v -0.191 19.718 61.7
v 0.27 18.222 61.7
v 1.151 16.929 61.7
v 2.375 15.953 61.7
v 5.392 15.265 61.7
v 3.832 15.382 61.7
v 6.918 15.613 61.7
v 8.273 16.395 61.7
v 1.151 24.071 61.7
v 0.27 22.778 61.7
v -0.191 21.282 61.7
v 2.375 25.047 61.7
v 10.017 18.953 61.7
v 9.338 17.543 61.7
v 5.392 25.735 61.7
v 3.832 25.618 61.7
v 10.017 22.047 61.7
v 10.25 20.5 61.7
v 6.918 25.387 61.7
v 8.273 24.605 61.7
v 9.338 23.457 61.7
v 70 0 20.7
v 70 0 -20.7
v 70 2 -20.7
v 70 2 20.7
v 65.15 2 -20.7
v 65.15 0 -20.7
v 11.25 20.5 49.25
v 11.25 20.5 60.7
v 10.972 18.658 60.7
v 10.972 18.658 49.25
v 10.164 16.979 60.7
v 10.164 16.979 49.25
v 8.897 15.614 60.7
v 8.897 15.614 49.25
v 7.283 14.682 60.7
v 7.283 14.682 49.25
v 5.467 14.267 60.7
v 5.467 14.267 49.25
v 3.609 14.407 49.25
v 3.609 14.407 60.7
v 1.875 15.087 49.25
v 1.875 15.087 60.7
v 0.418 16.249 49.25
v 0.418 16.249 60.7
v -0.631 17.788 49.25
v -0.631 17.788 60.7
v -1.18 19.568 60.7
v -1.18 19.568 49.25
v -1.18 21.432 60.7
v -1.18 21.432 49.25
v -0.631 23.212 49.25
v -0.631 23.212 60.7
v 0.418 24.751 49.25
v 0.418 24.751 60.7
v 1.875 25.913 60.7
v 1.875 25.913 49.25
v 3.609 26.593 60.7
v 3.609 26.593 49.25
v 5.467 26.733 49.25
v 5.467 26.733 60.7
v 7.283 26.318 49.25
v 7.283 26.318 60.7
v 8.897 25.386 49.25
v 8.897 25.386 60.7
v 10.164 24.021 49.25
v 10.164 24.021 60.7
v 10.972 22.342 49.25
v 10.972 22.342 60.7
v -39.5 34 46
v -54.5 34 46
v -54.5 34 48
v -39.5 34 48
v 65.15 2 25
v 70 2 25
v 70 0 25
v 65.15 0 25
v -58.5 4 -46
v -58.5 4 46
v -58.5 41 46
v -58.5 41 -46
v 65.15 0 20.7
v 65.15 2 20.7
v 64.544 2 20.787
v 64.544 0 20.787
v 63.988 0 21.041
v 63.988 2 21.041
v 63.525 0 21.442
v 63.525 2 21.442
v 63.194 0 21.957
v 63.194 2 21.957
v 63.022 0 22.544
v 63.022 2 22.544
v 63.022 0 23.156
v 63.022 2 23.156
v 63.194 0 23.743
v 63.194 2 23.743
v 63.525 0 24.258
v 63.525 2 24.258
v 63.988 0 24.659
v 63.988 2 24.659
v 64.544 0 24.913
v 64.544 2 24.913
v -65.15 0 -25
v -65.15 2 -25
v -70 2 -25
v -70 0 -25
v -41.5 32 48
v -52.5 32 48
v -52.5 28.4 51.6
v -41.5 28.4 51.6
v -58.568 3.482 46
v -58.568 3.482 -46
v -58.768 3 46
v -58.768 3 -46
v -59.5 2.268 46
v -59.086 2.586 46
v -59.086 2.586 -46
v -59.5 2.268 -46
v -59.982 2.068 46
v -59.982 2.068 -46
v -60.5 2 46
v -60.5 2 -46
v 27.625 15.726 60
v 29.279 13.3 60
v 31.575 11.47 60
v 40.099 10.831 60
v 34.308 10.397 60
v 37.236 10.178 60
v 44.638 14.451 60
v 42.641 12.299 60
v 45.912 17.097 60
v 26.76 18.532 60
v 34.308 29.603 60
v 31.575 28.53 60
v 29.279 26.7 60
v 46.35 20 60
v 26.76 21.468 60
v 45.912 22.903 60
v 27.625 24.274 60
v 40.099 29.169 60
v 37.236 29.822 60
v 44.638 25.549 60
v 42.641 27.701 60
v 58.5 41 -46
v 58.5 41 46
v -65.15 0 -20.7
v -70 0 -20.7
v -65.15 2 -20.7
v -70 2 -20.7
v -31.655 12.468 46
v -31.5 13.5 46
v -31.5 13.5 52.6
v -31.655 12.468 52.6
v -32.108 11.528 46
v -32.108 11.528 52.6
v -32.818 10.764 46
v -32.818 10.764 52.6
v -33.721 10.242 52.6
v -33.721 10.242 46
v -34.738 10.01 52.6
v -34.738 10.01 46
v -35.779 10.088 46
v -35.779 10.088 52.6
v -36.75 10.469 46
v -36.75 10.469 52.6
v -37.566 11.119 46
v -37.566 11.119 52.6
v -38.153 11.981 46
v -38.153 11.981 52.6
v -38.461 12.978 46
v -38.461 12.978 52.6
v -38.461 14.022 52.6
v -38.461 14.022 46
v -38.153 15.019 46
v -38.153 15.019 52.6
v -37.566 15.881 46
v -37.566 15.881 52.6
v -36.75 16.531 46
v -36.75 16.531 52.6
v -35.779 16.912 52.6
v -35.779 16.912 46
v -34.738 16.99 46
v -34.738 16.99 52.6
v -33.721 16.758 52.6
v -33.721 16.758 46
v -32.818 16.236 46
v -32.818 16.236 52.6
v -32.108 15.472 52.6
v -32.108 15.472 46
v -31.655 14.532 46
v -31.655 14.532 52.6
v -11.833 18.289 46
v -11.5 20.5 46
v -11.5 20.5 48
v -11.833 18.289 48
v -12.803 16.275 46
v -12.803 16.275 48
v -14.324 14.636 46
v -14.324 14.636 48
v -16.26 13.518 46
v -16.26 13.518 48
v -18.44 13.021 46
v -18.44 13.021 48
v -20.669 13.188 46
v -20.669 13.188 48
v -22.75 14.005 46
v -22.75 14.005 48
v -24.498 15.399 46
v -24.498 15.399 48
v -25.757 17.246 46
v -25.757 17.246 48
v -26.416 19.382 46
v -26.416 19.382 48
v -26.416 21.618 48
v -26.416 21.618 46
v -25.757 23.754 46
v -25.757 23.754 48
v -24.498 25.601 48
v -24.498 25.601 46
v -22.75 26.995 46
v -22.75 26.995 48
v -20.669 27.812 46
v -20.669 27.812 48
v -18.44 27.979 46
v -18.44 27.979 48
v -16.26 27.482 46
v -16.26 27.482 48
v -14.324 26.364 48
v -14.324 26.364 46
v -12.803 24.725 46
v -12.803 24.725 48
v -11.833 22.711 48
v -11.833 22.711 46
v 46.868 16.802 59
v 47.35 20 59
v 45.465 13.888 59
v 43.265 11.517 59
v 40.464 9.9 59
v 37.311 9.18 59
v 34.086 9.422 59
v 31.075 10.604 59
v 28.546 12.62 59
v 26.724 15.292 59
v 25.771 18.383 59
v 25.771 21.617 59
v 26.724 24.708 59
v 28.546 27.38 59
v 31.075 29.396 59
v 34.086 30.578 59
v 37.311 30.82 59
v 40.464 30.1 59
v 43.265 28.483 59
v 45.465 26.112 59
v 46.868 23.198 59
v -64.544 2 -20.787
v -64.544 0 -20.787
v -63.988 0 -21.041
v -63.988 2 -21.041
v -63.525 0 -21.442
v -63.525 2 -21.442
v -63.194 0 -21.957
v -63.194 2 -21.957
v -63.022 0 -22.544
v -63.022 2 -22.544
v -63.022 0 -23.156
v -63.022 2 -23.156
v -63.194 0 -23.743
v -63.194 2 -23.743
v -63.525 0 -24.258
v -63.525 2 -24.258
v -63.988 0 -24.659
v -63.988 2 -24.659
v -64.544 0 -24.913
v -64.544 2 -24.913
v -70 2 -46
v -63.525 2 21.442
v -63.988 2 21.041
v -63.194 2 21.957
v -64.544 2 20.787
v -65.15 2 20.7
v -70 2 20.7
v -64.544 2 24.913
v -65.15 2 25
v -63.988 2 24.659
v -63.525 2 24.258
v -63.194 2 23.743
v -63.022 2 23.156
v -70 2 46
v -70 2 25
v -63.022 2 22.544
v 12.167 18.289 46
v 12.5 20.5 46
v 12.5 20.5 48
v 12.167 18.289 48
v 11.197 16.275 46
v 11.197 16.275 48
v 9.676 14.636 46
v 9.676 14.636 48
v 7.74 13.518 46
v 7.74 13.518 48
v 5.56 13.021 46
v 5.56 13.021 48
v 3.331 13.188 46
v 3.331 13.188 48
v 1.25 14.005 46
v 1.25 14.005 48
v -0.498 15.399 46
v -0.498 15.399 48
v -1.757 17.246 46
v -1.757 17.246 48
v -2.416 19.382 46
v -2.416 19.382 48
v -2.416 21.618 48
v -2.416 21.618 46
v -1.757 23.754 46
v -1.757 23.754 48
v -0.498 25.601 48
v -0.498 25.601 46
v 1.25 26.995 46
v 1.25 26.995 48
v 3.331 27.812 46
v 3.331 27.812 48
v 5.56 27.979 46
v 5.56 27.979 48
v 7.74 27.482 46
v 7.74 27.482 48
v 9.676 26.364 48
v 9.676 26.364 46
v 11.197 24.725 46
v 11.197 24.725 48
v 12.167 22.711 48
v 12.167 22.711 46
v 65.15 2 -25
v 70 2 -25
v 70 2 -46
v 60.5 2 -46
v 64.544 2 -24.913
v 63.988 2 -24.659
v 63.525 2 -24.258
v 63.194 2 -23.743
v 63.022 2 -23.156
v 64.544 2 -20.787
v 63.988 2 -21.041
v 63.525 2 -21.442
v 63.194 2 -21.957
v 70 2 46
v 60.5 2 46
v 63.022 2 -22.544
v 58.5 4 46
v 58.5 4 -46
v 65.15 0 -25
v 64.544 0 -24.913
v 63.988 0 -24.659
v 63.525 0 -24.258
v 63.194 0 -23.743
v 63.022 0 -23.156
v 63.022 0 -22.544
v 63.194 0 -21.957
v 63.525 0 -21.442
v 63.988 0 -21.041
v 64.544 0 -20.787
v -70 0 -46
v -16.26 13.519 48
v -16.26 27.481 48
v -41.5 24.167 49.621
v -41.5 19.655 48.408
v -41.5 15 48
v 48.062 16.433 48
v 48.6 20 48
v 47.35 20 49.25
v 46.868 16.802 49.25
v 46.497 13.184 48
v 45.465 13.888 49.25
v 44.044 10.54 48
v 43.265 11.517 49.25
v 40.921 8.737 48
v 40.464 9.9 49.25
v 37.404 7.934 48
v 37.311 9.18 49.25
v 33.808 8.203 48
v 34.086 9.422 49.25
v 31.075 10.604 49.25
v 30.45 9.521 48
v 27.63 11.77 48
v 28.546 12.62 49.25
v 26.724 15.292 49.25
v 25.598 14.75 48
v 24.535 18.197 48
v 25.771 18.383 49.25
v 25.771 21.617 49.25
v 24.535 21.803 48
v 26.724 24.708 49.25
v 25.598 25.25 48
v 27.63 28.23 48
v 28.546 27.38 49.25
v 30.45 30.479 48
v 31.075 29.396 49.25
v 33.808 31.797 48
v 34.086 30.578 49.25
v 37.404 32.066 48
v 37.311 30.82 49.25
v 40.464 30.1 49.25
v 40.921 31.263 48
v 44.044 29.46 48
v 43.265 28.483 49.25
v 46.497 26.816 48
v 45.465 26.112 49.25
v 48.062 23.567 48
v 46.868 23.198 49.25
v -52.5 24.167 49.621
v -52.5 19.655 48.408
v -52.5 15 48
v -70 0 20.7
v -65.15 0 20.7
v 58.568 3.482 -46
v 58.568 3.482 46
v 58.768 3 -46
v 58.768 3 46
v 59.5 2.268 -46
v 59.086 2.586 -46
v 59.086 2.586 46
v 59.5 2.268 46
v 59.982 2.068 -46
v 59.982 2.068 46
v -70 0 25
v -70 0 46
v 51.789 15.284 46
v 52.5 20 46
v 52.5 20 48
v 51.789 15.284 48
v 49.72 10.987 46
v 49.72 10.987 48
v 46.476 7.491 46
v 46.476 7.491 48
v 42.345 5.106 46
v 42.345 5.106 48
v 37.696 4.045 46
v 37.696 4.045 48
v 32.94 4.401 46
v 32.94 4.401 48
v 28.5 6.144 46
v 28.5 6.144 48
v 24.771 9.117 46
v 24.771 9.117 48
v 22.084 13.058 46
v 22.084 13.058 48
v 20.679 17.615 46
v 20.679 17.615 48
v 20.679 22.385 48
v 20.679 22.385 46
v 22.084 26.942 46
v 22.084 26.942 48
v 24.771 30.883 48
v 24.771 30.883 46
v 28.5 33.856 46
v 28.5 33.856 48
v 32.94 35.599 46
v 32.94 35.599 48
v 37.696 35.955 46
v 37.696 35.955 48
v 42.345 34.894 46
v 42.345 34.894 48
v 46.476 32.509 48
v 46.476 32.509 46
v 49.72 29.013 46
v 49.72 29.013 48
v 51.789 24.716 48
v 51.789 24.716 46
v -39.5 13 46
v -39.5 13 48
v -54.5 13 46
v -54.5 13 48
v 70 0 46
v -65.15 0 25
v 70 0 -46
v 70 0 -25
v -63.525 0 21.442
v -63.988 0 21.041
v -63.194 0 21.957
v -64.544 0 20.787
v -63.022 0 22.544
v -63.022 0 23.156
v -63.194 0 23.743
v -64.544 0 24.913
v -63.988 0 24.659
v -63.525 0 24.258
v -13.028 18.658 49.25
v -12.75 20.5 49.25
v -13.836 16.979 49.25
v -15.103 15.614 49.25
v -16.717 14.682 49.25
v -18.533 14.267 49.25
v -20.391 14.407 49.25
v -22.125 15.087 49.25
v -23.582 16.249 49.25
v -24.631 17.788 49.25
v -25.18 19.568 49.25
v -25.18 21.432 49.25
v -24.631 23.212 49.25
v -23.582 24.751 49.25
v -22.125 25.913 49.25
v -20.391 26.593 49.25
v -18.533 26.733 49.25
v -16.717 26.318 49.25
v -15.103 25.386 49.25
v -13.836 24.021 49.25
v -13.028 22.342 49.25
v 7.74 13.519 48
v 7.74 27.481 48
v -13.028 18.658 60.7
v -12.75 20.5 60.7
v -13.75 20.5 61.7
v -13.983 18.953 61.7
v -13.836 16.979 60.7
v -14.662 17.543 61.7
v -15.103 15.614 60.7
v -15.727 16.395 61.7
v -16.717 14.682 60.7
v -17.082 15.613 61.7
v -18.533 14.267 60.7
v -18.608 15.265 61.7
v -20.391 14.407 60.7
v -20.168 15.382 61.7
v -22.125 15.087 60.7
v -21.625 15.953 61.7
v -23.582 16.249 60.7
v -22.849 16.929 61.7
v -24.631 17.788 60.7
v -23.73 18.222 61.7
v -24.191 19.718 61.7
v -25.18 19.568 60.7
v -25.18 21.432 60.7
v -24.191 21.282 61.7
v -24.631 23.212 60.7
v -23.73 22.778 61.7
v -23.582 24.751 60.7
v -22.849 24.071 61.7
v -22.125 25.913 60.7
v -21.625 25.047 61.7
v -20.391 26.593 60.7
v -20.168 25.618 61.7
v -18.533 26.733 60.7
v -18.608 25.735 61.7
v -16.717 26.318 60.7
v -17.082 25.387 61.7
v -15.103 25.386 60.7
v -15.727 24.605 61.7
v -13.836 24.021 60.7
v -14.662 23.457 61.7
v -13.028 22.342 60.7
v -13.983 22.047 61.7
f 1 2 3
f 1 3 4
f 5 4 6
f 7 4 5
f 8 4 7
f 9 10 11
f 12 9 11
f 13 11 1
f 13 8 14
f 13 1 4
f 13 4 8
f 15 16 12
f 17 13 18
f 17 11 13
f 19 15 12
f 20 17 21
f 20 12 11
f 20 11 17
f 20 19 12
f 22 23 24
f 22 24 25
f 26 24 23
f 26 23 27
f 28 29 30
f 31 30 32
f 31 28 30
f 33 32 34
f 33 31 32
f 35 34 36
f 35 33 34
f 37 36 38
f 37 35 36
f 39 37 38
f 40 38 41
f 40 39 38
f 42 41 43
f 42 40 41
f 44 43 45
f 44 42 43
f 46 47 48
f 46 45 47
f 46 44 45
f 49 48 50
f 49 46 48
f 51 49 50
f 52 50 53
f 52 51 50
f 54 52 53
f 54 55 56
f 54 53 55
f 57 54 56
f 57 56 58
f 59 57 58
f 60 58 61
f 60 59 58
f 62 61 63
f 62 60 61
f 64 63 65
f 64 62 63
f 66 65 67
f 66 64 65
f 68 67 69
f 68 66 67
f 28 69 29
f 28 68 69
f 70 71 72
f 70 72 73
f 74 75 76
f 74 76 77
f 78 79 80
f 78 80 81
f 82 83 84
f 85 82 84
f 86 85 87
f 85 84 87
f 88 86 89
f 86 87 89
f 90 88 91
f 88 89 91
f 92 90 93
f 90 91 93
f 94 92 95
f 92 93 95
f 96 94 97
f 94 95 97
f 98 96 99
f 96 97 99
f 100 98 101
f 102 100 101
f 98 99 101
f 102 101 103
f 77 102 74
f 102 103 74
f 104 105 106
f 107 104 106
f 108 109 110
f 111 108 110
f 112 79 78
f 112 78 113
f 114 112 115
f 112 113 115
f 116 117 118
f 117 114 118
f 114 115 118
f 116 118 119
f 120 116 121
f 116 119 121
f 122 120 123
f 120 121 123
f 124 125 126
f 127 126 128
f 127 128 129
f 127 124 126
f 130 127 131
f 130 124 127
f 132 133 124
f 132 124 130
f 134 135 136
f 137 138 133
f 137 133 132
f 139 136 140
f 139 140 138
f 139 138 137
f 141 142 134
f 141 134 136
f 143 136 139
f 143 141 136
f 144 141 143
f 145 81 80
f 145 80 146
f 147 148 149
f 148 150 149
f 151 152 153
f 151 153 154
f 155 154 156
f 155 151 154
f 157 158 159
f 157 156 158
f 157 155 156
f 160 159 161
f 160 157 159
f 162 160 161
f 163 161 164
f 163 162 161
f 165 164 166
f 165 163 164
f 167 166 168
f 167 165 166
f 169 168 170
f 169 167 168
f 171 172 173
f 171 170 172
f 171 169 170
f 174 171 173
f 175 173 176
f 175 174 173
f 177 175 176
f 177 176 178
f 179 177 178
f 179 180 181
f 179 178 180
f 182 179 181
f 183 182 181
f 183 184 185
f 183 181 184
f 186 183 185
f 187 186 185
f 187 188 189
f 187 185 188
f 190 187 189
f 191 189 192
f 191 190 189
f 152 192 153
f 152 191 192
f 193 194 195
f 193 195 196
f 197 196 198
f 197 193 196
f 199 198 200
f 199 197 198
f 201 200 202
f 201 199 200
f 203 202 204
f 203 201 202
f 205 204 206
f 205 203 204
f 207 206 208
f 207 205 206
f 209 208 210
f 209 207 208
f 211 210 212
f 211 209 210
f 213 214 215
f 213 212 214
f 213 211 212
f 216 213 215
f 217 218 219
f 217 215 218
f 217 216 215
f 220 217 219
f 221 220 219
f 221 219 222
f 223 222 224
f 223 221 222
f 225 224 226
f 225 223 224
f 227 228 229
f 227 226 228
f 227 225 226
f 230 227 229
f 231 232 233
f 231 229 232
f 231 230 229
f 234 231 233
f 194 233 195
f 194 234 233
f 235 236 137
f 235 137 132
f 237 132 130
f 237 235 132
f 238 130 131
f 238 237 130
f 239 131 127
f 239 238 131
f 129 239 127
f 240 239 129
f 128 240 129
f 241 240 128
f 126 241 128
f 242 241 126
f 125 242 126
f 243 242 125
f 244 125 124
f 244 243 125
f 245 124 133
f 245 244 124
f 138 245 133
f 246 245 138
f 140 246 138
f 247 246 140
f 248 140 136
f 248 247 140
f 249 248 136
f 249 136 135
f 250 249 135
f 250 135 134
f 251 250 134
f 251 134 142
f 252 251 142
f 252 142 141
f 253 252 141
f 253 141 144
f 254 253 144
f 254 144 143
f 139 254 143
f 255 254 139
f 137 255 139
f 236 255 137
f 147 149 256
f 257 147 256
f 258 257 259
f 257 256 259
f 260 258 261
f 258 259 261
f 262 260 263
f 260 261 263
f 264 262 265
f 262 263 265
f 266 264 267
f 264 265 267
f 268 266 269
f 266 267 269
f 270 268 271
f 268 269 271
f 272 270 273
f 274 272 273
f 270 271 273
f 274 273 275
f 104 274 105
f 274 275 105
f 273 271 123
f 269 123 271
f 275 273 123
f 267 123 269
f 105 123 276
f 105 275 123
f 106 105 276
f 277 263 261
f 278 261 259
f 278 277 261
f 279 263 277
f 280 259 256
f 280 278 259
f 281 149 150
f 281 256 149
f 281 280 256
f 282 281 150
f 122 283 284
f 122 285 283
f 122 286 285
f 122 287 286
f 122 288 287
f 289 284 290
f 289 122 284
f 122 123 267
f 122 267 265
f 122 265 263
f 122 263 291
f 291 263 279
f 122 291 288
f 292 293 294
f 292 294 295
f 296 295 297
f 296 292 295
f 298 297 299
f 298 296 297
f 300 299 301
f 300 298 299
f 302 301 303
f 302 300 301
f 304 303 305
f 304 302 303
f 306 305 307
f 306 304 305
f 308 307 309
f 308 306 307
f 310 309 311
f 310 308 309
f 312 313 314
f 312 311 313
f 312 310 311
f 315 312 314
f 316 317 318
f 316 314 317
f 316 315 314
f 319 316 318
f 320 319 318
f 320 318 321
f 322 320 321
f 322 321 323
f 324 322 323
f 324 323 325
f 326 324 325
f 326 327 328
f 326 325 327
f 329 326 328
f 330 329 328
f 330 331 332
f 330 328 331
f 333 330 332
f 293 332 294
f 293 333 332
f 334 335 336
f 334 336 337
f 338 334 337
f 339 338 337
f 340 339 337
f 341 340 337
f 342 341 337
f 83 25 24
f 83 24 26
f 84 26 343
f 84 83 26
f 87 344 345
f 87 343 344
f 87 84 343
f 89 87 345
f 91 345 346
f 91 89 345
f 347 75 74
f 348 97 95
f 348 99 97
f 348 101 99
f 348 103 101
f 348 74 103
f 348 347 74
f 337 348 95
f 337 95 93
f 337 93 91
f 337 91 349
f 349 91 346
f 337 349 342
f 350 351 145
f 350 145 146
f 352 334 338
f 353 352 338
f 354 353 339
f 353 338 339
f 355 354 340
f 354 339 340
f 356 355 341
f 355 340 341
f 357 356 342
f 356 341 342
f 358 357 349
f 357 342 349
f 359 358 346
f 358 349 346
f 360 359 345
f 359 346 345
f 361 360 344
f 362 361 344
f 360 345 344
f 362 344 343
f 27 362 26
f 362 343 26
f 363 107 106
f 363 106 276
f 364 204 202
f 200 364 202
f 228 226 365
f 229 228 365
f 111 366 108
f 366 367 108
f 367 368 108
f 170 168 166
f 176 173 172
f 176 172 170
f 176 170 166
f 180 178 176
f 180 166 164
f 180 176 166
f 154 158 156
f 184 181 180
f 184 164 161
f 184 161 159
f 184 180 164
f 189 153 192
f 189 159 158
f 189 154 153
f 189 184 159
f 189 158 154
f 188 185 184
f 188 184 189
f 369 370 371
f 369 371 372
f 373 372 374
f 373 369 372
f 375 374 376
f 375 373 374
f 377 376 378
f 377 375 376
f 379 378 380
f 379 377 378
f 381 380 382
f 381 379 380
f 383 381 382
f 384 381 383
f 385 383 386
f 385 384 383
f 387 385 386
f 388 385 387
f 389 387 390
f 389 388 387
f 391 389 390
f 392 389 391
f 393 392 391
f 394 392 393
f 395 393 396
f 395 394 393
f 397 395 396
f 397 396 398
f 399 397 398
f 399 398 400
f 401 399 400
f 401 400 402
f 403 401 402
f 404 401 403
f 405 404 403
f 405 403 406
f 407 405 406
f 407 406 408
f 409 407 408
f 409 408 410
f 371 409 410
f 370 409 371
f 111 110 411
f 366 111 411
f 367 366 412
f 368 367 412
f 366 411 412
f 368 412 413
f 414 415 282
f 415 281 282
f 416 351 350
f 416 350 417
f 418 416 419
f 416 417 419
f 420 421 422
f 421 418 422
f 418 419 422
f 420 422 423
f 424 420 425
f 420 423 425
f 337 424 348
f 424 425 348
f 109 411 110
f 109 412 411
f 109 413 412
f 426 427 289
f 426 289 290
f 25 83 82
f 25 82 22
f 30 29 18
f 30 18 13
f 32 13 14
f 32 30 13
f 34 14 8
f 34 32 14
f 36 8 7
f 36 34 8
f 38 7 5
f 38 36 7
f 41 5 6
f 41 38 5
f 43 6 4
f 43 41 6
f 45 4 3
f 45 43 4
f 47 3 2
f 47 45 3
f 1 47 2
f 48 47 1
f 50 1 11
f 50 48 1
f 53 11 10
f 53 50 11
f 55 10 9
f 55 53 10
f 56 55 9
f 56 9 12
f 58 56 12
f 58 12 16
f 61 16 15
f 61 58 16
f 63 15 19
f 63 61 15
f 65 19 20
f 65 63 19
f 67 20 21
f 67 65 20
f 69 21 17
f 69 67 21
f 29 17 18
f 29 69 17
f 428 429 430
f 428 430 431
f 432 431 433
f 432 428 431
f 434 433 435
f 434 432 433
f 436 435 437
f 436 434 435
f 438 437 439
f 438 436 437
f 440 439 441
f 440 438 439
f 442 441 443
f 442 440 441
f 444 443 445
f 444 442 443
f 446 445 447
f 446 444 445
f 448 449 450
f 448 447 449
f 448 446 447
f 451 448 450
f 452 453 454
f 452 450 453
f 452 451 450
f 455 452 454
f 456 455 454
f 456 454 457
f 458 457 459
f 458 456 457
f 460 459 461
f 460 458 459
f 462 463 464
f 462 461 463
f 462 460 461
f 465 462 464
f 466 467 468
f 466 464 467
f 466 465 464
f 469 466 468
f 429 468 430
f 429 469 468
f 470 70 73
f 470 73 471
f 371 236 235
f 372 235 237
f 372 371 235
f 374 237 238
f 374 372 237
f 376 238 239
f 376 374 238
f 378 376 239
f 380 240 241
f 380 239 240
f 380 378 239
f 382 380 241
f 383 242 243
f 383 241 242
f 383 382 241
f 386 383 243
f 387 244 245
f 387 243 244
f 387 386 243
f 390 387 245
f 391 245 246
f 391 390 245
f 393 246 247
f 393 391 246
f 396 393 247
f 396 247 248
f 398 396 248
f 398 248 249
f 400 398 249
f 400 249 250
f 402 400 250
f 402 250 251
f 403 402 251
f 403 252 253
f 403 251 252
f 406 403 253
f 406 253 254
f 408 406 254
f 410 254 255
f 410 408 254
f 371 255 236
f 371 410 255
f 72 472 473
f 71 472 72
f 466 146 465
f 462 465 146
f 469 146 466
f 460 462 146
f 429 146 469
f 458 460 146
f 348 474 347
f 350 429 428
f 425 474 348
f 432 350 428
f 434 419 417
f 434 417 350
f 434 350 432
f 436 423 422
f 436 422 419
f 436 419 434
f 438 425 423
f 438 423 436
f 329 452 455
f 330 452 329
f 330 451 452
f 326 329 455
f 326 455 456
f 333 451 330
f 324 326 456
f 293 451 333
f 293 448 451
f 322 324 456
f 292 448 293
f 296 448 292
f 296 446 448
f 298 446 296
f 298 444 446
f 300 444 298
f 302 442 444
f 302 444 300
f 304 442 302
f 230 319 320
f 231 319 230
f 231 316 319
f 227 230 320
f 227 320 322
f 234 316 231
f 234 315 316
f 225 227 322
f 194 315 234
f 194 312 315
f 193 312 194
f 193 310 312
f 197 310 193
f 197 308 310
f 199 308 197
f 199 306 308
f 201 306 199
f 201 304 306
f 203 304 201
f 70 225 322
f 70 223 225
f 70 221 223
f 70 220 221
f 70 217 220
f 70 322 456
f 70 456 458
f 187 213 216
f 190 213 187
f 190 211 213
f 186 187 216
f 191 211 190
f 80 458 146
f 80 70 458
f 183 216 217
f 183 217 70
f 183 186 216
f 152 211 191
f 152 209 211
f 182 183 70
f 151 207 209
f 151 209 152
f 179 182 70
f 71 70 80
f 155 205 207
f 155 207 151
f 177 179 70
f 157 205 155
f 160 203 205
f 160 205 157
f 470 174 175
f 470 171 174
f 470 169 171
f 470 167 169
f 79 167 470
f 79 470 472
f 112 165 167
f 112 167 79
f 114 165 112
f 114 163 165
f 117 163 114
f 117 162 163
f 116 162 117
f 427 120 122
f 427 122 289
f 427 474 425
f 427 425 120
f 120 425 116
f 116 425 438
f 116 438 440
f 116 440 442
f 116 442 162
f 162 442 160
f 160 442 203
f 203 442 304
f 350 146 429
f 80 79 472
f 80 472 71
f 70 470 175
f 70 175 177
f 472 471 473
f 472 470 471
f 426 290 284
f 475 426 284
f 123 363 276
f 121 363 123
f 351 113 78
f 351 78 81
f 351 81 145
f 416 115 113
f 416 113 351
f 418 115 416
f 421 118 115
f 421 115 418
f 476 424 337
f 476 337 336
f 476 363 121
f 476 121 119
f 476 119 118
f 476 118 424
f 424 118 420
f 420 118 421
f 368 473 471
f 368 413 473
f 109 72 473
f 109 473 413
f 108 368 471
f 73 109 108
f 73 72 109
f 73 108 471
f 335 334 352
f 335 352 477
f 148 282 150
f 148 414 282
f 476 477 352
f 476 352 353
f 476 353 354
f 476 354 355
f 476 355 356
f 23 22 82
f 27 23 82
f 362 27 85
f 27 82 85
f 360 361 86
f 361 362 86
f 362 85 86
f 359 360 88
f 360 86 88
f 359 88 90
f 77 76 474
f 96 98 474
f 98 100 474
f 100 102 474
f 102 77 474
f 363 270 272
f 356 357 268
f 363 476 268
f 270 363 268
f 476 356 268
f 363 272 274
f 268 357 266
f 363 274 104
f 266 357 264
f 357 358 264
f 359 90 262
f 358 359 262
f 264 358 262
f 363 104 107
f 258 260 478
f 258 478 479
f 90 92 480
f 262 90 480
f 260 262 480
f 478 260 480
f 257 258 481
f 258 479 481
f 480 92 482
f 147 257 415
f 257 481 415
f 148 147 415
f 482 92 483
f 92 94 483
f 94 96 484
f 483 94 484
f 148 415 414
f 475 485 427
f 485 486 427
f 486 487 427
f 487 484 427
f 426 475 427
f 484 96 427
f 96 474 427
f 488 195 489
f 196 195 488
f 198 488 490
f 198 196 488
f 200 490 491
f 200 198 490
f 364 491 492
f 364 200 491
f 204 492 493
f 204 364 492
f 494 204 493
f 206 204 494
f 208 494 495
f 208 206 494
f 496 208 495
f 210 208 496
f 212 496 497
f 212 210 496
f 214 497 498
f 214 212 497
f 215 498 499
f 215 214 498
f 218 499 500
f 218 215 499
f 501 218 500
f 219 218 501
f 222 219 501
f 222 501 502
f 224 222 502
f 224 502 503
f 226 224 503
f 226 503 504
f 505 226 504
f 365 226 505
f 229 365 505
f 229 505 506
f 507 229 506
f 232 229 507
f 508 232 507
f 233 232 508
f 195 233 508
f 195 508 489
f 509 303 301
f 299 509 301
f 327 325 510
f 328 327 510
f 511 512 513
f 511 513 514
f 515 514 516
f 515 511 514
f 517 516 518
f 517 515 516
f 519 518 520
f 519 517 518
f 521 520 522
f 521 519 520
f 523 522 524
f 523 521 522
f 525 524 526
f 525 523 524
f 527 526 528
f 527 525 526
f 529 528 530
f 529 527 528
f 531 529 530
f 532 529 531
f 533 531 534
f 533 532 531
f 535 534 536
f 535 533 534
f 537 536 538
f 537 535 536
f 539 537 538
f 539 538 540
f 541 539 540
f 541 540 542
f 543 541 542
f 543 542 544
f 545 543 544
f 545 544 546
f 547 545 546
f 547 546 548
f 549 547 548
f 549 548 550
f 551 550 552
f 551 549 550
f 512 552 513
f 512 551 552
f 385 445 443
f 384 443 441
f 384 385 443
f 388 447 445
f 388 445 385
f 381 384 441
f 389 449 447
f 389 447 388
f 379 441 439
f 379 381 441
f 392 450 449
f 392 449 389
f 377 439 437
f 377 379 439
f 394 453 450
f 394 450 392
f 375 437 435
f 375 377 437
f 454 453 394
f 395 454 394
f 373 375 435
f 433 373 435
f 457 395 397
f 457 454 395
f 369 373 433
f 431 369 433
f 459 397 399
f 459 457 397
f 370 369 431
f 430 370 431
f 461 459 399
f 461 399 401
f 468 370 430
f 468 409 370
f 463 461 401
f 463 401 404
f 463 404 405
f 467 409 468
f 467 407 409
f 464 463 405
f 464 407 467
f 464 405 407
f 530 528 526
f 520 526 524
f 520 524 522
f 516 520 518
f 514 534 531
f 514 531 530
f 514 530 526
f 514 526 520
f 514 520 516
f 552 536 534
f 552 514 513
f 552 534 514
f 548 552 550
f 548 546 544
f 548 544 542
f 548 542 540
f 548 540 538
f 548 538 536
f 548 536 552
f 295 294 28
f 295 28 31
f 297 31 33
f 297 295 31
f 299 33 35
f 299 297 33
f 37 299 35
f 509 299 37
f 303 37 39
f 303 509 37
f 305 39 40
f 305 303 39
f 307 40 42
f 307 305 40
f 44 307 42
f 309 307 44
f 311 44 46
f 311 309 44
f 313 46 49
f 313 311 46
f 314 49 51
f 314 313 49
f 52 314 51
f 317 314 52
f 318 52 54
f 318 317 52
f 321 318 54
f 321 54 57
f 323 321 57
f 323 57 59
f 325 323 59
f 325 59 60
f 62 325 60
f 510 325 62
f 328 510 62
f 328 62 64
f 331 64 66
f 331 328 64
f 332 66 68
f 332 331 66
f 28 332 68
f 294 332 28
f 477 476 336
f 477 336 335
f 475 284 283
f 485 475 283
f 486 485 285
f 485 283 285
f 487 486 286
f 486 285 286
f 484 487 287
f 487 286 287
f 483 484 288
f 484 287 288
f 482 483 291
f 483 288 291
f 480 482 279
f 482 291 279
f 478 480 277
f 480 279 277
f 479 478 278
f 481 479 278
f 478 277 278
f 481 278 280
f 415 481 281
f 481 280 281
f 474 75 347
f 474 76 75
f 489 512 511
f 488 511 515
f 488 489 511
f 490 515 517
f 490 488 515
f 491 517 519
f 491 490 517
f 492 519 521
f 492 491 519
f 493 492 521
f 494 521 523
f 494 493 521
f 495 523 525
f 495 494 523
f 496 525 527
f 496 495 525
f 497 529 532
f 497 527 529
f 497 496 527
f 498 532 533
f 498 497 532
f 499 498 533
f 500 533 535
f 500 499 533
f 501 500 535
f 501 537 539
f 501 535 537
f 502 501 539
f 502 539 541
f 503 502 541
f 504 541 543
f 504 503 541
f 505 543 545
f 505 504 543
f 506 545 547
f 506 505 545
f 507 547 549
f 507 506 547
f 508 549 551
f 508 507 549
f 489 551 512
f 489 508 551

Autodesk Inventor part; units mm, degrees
ref_plane "YZ Plane" through (0, 0, 0) normal (1, 0, 0) x (0, 1, 0)
sketch "Sketch1" plane through (0, 0, 0) normal (0, 1, 0) x (-1, 0, 0)
  line L0 (70, -46) -> (-70, -46)
  line L1 (-70, -46) -> (-70, 46)
  line L2 (-70, 46) -> (70, 46)
  line L3 (70, 46) -> (70, -46)
  point P0 (0, 0)
  point P1 (0, -46)
  point P2 (-70, 0)
  dimension "d0" = 92
  dimension "d1" = 140
extrude "Extrusion1" add sketch "Sketch1" along normal blind 2
sketch "Sketch2" plane through (0, 2, 0) normal (0, 1, 0) x (1, 0, 0)
  line L0 (70, 46) -> (-70, 46) projected
  line L1 (-70, 46) -> (-70, -46) projected
  line L2 (-70, -46) -> (70, -46) projected
  line L3 (70, -46) -> (70, 46) projected
  line L4 (70, 46) -> (-70, 46) projected
  line L5 (-70, -46) -> (70, -46) projected
  line L6 (-58.5, 46) -> (58.5, 46)
  line L7 (58.5, 46) -> (58.5, -46)
  line L8 (58.5, -46) -> (-58.5, -46)
  line L9 (-58.5, -46) -> (-58.5, 46)
  point P0 (0, 0)
  point P1 (0, 46)
  dimension "d4" = 117
extrude "Extrusion2" add sketch "Sketch2" along normal blind 39 contours L7 L2 L9 L0
fillet "Fillet1" radius 2 2 edges at (58.5, 2, 0) (-58.5, 2, 0)
sketch "Sketch3" plane through (-70, 0, 46) normal (0, 0, 1) x (1, 0, 0)
  line L0 (140, 0) -> (0, 0) projected
  line L1 (140, 0) -> (140, 2) projected
  line L2 (130.5, 2) -> (140, 2) projected
  arc A0 (128.5, 4) -> (130.5, 2) centre (130.5, 4) ccw projected
  line L3 (128.5, 4) -> (128.5, 41) projected
  line L4 (11.5, 41) -> (128.5, 41) projected
  line L5 (11.5, 4) -> (11.5, 41) projected
  arc A1 (9.5, 2) -> (11.5, 4) centre (9.5, 4) ccw projected
  line L6 (0, 2) -> (9.5, 2) projected
  line L7 (0, 0) -> (0, 2) projected
  circle A2 centre (106.5, 20) radius 16
  circle A3 centre (75, 20.5) radius 7.5
  circle A4 centre (51, 20.5) radius 7.5
  circle A5 centre (35, 13.5) radius 3.5
  line L8 (15.5, 34) -> (30.5, 34)
  line L9 (30.5, 34) -> (30.5, 13)
  line L10 (30.5, 13) -> (15.5, 13)
  line L11 (15.5, 13) -> (15.5, 34)
  point P0 (70, 0)
  dimension "d8" = 32
  dimension "d9" = 15
  dimension "d10" = 15
  dimension "d11" = 7
  dimension "d12" = 15
  dimension "d13" = 21
  dimension "d14" = 4
  dimension "d15" = 7
  dimension "d17" = 10
  dimension "d18" = 20
  dimension "d19" = 13
  dimension "d20" = 32
  dimension "d21" = 13
  dimension "d22" = 56
  dimension "d23" = 4
  dimension "d24" = 6
extrude "Extrusion3" add sketch "Sketch3" along normal blind 2 contours A2 | A3 | A4 | A5 | L8 L9 L10 L11
sketch "Sketch4" plane through (-70, 0, 46) normal (0, 0, 1) x (1, 0, 0)
  circle A0 centre (35, 13.5) radius 3.5 projected
  circle A1 centre (51, 20.5) radius 7.5 projected
  circle A2 centre (75, 20.5) radius 7.5 projected
  circle A3 centre (106.5, 20) radius 16 projected
  circle A4 centre (51, 20.5) radius 6.25
  circle A5 centre (75, 20.5) radius 6.25
  point P0 (70, 0)
  dimension "d28" = 12.5
  dimension "d30" = 12.5
extrude "Extrusion4" add sketch "Sketch4" along normal blind 15.7 contours A4 | A5
sketch "Sketch5" plane through (-70, 0, 46) normal (0, 0, 1) x (1, 0, 0)
  circle A0 centre (106.5, 20) radius 16 projected
  circle A1 centre (106.5, 20) radius 10.85
  point P0 (70, 0)
  dimension "d33" = 21.7
extrude "Extrusion5" add sketch "Sketch5" along normal blind 14 contours A1
sketch "Sketch6" plane through (-70, 0, 46) normal (0, 0, 1) x (1, 0, 0)
  circle A0 centre (35, 13.5) radius 3.5 projected
  circle A1 centre (35, 13.5) radius 3.5
  point P0 (70, 0)
extrude "Extrusion6" add sketch "Sketch6" along normal blind 6.6
chamfer "Chamfer1" distance 1.25 angle 45 3 edges at (25.65, 20, 48) (-1.25, 20.5, 48) (-25.25, 20.5, 48)
chamfer "Chamfer2" distance 1 angle 45 3 edges at (-25.25, 20.5, 61.7) (-1.25, 20.5, 61.7) (25.65, 20, 60)
ref_plane "Work Plane1" through (-52.5, 13, 46) normal (-1, 0, 0) x (0, 0, 1)
ref_plane "Work Plane2" through (-41.5, 13, 46) normal (1, 0, 0) x (0, 0, -1)
sketch "Sketch7" plane through (-52.5, 13, 46) normal (-1, 0, 0) x (0, 0, 1)
  line L0 (0, 0) -> (0, 21) projected
  line L1 (0, 0) -> (2, 0) projected
  line L2 (2, 21) -> (2, 0) projected
  line L3 (0, 21) -> (2, 21) projected
  line L4 (2, -9) -> (2, 23) projected
  line L5 (2, 19) -> (2, 2)
  line L6 (2, 19) -> (5.6, 15.4)
  arc A0 (5.6, 15.4) -> (2, 2) centre (28.7389, 2) ccw
  point P0 (-46, -13)
  dimension "d46" = 2
  dimension "d47" = 2
  dimension "d48" = 45
  dimension "d49" = 3.6
extrude "Extrusion7" add sketch "Sketch7" against normal up to surface (11 mm away) contours L2 L6 A0
sketch "Sketch8" plane through (0, 2, 0) normal (0, 1, 0) x (1, 0, 0)
  line L0 (-60.5, 46) -> (-60.5, -46) projected
  line L1 (-60.5, 46) -> (-70, 46) projected
  line L2 (-70, 46) -> (-70, -46) projected
  line L3 (-70, -46) -> (-60.5, -46) projected
  line L4 (60.5, -46) -> (60.5, 46) projected
  line L5 (60.5, -46) -> (70, -46) projected
  line L6 (70, -46) -> (70, 46) projected
  line L7 (70, 46) -> (60.5, 46) projected
  line L8 (-70, 46) -> (-70, -46) projected
  line L9 (-70, 22.85) -> (-65.15, 22.85) construction
  line L10 (-70, 20.7) -> (-65.15, 20.7)
  line L11 (-65.15, 25) -> (-70, 25)
  arc A0 (-70, 25) -> (-70, 20.7) centre (-70, 22.85) ccw
  arc A1 (-65.15, 20.7) -> (-65.15, 25) centre (-65.15, 22.85) ccw
  line L12 (-70, -22.85) -> (-65.15, -22.85) construction
  line L13 (-70, -25) -> (-65.15, -25)
  line L14 (-65.15, -20.7) -> (-70, -20.7)
  arc A2 (-70, -20.7) -> (-70, -25) centre (-70, -22.85) ccw
  arc A3 (-65.15, -25) -> (-65.15, -20.7) centre (-65.15, -22.85) ccw
  line L15 (70, -22.85) -> (65.15, -22.85) construction
  line L16 (70, -25) -> (65.15, -25)
  line L17 (65.15, -20.7) -> (70, -20.7)
  arc A4 (70, -25) -> (70, -20.7) centre (70, -22.85) ccw
  arc A5 (65.15, -20.7) -> (65.15, -25) centre (65.15, -22.85) ccw
  line L18 (70, 46) -> (70, -46) projected
  line L19 (70, 22.85) -> (65.15, 22.85) construction
  line L20 (70, 20.7) -> (65.15, 20.7)
  line L21 (65.15, 25) -> (70, 25)
  arc A6 (70, 20.7) -> (70, 25) centre (70, 22.85) ccw
  arc A7 (65.15, 25) -> (65.15, 20.7) centre (65.15, 22.85) ccw
  line L22 (70, -46) -> (70, 46) projected
  point P0 (0, 0)
  point P1 (-67.575, 22.85)
  point P2 (-67.575, -22.85)
  point P3 (67.575, -22.85)
  point P4 (67.575, 22.85)
  dimension "d52" = 4.3
  dimension "d54" = 4.3
  dimension "d55" = 4.3
  dimension "d56" = 7
  dimension "d58" = 7
  dimension "d59" = 7
  dimension "d66" = 4.3
  dimension "d67" = 7
  dimension "d68" = 23.15
  dimension "d69" = 23.15
  dimension "d70" = 23.15
  dimension "d71" = 23.15
extrude "Extrusion8" cut sketch "Sketch8" against normal through all contours L11 A1 L10 L2 | L2 A0 | A2 L2 | L2 L14 A3 L13 | L16 A5 L17 L6 | L6 A4 | A6 L6 | L6 L20 A7 L21
equation "\"d10\" = d9"
equation "\"d21\" = d19"
equation "\"d28\" = d27"
equation "\"d30\" = d28"
equation "\"d54\" = d52"
equation "\"d55\" = d52"
equation "\"d58\" = d56"
equation "\"d59\" = d56"
equation "\"d66\" = d52"
equation "\"d67\" = d56"
equation "\"d69\" = d68"
equation "\"d70\" = d68"
equation "\"d71\" = d68"
equation "\"d27\" = 12.5"
properties part number "AmpLP2020A" material "Aluminum 6061"
